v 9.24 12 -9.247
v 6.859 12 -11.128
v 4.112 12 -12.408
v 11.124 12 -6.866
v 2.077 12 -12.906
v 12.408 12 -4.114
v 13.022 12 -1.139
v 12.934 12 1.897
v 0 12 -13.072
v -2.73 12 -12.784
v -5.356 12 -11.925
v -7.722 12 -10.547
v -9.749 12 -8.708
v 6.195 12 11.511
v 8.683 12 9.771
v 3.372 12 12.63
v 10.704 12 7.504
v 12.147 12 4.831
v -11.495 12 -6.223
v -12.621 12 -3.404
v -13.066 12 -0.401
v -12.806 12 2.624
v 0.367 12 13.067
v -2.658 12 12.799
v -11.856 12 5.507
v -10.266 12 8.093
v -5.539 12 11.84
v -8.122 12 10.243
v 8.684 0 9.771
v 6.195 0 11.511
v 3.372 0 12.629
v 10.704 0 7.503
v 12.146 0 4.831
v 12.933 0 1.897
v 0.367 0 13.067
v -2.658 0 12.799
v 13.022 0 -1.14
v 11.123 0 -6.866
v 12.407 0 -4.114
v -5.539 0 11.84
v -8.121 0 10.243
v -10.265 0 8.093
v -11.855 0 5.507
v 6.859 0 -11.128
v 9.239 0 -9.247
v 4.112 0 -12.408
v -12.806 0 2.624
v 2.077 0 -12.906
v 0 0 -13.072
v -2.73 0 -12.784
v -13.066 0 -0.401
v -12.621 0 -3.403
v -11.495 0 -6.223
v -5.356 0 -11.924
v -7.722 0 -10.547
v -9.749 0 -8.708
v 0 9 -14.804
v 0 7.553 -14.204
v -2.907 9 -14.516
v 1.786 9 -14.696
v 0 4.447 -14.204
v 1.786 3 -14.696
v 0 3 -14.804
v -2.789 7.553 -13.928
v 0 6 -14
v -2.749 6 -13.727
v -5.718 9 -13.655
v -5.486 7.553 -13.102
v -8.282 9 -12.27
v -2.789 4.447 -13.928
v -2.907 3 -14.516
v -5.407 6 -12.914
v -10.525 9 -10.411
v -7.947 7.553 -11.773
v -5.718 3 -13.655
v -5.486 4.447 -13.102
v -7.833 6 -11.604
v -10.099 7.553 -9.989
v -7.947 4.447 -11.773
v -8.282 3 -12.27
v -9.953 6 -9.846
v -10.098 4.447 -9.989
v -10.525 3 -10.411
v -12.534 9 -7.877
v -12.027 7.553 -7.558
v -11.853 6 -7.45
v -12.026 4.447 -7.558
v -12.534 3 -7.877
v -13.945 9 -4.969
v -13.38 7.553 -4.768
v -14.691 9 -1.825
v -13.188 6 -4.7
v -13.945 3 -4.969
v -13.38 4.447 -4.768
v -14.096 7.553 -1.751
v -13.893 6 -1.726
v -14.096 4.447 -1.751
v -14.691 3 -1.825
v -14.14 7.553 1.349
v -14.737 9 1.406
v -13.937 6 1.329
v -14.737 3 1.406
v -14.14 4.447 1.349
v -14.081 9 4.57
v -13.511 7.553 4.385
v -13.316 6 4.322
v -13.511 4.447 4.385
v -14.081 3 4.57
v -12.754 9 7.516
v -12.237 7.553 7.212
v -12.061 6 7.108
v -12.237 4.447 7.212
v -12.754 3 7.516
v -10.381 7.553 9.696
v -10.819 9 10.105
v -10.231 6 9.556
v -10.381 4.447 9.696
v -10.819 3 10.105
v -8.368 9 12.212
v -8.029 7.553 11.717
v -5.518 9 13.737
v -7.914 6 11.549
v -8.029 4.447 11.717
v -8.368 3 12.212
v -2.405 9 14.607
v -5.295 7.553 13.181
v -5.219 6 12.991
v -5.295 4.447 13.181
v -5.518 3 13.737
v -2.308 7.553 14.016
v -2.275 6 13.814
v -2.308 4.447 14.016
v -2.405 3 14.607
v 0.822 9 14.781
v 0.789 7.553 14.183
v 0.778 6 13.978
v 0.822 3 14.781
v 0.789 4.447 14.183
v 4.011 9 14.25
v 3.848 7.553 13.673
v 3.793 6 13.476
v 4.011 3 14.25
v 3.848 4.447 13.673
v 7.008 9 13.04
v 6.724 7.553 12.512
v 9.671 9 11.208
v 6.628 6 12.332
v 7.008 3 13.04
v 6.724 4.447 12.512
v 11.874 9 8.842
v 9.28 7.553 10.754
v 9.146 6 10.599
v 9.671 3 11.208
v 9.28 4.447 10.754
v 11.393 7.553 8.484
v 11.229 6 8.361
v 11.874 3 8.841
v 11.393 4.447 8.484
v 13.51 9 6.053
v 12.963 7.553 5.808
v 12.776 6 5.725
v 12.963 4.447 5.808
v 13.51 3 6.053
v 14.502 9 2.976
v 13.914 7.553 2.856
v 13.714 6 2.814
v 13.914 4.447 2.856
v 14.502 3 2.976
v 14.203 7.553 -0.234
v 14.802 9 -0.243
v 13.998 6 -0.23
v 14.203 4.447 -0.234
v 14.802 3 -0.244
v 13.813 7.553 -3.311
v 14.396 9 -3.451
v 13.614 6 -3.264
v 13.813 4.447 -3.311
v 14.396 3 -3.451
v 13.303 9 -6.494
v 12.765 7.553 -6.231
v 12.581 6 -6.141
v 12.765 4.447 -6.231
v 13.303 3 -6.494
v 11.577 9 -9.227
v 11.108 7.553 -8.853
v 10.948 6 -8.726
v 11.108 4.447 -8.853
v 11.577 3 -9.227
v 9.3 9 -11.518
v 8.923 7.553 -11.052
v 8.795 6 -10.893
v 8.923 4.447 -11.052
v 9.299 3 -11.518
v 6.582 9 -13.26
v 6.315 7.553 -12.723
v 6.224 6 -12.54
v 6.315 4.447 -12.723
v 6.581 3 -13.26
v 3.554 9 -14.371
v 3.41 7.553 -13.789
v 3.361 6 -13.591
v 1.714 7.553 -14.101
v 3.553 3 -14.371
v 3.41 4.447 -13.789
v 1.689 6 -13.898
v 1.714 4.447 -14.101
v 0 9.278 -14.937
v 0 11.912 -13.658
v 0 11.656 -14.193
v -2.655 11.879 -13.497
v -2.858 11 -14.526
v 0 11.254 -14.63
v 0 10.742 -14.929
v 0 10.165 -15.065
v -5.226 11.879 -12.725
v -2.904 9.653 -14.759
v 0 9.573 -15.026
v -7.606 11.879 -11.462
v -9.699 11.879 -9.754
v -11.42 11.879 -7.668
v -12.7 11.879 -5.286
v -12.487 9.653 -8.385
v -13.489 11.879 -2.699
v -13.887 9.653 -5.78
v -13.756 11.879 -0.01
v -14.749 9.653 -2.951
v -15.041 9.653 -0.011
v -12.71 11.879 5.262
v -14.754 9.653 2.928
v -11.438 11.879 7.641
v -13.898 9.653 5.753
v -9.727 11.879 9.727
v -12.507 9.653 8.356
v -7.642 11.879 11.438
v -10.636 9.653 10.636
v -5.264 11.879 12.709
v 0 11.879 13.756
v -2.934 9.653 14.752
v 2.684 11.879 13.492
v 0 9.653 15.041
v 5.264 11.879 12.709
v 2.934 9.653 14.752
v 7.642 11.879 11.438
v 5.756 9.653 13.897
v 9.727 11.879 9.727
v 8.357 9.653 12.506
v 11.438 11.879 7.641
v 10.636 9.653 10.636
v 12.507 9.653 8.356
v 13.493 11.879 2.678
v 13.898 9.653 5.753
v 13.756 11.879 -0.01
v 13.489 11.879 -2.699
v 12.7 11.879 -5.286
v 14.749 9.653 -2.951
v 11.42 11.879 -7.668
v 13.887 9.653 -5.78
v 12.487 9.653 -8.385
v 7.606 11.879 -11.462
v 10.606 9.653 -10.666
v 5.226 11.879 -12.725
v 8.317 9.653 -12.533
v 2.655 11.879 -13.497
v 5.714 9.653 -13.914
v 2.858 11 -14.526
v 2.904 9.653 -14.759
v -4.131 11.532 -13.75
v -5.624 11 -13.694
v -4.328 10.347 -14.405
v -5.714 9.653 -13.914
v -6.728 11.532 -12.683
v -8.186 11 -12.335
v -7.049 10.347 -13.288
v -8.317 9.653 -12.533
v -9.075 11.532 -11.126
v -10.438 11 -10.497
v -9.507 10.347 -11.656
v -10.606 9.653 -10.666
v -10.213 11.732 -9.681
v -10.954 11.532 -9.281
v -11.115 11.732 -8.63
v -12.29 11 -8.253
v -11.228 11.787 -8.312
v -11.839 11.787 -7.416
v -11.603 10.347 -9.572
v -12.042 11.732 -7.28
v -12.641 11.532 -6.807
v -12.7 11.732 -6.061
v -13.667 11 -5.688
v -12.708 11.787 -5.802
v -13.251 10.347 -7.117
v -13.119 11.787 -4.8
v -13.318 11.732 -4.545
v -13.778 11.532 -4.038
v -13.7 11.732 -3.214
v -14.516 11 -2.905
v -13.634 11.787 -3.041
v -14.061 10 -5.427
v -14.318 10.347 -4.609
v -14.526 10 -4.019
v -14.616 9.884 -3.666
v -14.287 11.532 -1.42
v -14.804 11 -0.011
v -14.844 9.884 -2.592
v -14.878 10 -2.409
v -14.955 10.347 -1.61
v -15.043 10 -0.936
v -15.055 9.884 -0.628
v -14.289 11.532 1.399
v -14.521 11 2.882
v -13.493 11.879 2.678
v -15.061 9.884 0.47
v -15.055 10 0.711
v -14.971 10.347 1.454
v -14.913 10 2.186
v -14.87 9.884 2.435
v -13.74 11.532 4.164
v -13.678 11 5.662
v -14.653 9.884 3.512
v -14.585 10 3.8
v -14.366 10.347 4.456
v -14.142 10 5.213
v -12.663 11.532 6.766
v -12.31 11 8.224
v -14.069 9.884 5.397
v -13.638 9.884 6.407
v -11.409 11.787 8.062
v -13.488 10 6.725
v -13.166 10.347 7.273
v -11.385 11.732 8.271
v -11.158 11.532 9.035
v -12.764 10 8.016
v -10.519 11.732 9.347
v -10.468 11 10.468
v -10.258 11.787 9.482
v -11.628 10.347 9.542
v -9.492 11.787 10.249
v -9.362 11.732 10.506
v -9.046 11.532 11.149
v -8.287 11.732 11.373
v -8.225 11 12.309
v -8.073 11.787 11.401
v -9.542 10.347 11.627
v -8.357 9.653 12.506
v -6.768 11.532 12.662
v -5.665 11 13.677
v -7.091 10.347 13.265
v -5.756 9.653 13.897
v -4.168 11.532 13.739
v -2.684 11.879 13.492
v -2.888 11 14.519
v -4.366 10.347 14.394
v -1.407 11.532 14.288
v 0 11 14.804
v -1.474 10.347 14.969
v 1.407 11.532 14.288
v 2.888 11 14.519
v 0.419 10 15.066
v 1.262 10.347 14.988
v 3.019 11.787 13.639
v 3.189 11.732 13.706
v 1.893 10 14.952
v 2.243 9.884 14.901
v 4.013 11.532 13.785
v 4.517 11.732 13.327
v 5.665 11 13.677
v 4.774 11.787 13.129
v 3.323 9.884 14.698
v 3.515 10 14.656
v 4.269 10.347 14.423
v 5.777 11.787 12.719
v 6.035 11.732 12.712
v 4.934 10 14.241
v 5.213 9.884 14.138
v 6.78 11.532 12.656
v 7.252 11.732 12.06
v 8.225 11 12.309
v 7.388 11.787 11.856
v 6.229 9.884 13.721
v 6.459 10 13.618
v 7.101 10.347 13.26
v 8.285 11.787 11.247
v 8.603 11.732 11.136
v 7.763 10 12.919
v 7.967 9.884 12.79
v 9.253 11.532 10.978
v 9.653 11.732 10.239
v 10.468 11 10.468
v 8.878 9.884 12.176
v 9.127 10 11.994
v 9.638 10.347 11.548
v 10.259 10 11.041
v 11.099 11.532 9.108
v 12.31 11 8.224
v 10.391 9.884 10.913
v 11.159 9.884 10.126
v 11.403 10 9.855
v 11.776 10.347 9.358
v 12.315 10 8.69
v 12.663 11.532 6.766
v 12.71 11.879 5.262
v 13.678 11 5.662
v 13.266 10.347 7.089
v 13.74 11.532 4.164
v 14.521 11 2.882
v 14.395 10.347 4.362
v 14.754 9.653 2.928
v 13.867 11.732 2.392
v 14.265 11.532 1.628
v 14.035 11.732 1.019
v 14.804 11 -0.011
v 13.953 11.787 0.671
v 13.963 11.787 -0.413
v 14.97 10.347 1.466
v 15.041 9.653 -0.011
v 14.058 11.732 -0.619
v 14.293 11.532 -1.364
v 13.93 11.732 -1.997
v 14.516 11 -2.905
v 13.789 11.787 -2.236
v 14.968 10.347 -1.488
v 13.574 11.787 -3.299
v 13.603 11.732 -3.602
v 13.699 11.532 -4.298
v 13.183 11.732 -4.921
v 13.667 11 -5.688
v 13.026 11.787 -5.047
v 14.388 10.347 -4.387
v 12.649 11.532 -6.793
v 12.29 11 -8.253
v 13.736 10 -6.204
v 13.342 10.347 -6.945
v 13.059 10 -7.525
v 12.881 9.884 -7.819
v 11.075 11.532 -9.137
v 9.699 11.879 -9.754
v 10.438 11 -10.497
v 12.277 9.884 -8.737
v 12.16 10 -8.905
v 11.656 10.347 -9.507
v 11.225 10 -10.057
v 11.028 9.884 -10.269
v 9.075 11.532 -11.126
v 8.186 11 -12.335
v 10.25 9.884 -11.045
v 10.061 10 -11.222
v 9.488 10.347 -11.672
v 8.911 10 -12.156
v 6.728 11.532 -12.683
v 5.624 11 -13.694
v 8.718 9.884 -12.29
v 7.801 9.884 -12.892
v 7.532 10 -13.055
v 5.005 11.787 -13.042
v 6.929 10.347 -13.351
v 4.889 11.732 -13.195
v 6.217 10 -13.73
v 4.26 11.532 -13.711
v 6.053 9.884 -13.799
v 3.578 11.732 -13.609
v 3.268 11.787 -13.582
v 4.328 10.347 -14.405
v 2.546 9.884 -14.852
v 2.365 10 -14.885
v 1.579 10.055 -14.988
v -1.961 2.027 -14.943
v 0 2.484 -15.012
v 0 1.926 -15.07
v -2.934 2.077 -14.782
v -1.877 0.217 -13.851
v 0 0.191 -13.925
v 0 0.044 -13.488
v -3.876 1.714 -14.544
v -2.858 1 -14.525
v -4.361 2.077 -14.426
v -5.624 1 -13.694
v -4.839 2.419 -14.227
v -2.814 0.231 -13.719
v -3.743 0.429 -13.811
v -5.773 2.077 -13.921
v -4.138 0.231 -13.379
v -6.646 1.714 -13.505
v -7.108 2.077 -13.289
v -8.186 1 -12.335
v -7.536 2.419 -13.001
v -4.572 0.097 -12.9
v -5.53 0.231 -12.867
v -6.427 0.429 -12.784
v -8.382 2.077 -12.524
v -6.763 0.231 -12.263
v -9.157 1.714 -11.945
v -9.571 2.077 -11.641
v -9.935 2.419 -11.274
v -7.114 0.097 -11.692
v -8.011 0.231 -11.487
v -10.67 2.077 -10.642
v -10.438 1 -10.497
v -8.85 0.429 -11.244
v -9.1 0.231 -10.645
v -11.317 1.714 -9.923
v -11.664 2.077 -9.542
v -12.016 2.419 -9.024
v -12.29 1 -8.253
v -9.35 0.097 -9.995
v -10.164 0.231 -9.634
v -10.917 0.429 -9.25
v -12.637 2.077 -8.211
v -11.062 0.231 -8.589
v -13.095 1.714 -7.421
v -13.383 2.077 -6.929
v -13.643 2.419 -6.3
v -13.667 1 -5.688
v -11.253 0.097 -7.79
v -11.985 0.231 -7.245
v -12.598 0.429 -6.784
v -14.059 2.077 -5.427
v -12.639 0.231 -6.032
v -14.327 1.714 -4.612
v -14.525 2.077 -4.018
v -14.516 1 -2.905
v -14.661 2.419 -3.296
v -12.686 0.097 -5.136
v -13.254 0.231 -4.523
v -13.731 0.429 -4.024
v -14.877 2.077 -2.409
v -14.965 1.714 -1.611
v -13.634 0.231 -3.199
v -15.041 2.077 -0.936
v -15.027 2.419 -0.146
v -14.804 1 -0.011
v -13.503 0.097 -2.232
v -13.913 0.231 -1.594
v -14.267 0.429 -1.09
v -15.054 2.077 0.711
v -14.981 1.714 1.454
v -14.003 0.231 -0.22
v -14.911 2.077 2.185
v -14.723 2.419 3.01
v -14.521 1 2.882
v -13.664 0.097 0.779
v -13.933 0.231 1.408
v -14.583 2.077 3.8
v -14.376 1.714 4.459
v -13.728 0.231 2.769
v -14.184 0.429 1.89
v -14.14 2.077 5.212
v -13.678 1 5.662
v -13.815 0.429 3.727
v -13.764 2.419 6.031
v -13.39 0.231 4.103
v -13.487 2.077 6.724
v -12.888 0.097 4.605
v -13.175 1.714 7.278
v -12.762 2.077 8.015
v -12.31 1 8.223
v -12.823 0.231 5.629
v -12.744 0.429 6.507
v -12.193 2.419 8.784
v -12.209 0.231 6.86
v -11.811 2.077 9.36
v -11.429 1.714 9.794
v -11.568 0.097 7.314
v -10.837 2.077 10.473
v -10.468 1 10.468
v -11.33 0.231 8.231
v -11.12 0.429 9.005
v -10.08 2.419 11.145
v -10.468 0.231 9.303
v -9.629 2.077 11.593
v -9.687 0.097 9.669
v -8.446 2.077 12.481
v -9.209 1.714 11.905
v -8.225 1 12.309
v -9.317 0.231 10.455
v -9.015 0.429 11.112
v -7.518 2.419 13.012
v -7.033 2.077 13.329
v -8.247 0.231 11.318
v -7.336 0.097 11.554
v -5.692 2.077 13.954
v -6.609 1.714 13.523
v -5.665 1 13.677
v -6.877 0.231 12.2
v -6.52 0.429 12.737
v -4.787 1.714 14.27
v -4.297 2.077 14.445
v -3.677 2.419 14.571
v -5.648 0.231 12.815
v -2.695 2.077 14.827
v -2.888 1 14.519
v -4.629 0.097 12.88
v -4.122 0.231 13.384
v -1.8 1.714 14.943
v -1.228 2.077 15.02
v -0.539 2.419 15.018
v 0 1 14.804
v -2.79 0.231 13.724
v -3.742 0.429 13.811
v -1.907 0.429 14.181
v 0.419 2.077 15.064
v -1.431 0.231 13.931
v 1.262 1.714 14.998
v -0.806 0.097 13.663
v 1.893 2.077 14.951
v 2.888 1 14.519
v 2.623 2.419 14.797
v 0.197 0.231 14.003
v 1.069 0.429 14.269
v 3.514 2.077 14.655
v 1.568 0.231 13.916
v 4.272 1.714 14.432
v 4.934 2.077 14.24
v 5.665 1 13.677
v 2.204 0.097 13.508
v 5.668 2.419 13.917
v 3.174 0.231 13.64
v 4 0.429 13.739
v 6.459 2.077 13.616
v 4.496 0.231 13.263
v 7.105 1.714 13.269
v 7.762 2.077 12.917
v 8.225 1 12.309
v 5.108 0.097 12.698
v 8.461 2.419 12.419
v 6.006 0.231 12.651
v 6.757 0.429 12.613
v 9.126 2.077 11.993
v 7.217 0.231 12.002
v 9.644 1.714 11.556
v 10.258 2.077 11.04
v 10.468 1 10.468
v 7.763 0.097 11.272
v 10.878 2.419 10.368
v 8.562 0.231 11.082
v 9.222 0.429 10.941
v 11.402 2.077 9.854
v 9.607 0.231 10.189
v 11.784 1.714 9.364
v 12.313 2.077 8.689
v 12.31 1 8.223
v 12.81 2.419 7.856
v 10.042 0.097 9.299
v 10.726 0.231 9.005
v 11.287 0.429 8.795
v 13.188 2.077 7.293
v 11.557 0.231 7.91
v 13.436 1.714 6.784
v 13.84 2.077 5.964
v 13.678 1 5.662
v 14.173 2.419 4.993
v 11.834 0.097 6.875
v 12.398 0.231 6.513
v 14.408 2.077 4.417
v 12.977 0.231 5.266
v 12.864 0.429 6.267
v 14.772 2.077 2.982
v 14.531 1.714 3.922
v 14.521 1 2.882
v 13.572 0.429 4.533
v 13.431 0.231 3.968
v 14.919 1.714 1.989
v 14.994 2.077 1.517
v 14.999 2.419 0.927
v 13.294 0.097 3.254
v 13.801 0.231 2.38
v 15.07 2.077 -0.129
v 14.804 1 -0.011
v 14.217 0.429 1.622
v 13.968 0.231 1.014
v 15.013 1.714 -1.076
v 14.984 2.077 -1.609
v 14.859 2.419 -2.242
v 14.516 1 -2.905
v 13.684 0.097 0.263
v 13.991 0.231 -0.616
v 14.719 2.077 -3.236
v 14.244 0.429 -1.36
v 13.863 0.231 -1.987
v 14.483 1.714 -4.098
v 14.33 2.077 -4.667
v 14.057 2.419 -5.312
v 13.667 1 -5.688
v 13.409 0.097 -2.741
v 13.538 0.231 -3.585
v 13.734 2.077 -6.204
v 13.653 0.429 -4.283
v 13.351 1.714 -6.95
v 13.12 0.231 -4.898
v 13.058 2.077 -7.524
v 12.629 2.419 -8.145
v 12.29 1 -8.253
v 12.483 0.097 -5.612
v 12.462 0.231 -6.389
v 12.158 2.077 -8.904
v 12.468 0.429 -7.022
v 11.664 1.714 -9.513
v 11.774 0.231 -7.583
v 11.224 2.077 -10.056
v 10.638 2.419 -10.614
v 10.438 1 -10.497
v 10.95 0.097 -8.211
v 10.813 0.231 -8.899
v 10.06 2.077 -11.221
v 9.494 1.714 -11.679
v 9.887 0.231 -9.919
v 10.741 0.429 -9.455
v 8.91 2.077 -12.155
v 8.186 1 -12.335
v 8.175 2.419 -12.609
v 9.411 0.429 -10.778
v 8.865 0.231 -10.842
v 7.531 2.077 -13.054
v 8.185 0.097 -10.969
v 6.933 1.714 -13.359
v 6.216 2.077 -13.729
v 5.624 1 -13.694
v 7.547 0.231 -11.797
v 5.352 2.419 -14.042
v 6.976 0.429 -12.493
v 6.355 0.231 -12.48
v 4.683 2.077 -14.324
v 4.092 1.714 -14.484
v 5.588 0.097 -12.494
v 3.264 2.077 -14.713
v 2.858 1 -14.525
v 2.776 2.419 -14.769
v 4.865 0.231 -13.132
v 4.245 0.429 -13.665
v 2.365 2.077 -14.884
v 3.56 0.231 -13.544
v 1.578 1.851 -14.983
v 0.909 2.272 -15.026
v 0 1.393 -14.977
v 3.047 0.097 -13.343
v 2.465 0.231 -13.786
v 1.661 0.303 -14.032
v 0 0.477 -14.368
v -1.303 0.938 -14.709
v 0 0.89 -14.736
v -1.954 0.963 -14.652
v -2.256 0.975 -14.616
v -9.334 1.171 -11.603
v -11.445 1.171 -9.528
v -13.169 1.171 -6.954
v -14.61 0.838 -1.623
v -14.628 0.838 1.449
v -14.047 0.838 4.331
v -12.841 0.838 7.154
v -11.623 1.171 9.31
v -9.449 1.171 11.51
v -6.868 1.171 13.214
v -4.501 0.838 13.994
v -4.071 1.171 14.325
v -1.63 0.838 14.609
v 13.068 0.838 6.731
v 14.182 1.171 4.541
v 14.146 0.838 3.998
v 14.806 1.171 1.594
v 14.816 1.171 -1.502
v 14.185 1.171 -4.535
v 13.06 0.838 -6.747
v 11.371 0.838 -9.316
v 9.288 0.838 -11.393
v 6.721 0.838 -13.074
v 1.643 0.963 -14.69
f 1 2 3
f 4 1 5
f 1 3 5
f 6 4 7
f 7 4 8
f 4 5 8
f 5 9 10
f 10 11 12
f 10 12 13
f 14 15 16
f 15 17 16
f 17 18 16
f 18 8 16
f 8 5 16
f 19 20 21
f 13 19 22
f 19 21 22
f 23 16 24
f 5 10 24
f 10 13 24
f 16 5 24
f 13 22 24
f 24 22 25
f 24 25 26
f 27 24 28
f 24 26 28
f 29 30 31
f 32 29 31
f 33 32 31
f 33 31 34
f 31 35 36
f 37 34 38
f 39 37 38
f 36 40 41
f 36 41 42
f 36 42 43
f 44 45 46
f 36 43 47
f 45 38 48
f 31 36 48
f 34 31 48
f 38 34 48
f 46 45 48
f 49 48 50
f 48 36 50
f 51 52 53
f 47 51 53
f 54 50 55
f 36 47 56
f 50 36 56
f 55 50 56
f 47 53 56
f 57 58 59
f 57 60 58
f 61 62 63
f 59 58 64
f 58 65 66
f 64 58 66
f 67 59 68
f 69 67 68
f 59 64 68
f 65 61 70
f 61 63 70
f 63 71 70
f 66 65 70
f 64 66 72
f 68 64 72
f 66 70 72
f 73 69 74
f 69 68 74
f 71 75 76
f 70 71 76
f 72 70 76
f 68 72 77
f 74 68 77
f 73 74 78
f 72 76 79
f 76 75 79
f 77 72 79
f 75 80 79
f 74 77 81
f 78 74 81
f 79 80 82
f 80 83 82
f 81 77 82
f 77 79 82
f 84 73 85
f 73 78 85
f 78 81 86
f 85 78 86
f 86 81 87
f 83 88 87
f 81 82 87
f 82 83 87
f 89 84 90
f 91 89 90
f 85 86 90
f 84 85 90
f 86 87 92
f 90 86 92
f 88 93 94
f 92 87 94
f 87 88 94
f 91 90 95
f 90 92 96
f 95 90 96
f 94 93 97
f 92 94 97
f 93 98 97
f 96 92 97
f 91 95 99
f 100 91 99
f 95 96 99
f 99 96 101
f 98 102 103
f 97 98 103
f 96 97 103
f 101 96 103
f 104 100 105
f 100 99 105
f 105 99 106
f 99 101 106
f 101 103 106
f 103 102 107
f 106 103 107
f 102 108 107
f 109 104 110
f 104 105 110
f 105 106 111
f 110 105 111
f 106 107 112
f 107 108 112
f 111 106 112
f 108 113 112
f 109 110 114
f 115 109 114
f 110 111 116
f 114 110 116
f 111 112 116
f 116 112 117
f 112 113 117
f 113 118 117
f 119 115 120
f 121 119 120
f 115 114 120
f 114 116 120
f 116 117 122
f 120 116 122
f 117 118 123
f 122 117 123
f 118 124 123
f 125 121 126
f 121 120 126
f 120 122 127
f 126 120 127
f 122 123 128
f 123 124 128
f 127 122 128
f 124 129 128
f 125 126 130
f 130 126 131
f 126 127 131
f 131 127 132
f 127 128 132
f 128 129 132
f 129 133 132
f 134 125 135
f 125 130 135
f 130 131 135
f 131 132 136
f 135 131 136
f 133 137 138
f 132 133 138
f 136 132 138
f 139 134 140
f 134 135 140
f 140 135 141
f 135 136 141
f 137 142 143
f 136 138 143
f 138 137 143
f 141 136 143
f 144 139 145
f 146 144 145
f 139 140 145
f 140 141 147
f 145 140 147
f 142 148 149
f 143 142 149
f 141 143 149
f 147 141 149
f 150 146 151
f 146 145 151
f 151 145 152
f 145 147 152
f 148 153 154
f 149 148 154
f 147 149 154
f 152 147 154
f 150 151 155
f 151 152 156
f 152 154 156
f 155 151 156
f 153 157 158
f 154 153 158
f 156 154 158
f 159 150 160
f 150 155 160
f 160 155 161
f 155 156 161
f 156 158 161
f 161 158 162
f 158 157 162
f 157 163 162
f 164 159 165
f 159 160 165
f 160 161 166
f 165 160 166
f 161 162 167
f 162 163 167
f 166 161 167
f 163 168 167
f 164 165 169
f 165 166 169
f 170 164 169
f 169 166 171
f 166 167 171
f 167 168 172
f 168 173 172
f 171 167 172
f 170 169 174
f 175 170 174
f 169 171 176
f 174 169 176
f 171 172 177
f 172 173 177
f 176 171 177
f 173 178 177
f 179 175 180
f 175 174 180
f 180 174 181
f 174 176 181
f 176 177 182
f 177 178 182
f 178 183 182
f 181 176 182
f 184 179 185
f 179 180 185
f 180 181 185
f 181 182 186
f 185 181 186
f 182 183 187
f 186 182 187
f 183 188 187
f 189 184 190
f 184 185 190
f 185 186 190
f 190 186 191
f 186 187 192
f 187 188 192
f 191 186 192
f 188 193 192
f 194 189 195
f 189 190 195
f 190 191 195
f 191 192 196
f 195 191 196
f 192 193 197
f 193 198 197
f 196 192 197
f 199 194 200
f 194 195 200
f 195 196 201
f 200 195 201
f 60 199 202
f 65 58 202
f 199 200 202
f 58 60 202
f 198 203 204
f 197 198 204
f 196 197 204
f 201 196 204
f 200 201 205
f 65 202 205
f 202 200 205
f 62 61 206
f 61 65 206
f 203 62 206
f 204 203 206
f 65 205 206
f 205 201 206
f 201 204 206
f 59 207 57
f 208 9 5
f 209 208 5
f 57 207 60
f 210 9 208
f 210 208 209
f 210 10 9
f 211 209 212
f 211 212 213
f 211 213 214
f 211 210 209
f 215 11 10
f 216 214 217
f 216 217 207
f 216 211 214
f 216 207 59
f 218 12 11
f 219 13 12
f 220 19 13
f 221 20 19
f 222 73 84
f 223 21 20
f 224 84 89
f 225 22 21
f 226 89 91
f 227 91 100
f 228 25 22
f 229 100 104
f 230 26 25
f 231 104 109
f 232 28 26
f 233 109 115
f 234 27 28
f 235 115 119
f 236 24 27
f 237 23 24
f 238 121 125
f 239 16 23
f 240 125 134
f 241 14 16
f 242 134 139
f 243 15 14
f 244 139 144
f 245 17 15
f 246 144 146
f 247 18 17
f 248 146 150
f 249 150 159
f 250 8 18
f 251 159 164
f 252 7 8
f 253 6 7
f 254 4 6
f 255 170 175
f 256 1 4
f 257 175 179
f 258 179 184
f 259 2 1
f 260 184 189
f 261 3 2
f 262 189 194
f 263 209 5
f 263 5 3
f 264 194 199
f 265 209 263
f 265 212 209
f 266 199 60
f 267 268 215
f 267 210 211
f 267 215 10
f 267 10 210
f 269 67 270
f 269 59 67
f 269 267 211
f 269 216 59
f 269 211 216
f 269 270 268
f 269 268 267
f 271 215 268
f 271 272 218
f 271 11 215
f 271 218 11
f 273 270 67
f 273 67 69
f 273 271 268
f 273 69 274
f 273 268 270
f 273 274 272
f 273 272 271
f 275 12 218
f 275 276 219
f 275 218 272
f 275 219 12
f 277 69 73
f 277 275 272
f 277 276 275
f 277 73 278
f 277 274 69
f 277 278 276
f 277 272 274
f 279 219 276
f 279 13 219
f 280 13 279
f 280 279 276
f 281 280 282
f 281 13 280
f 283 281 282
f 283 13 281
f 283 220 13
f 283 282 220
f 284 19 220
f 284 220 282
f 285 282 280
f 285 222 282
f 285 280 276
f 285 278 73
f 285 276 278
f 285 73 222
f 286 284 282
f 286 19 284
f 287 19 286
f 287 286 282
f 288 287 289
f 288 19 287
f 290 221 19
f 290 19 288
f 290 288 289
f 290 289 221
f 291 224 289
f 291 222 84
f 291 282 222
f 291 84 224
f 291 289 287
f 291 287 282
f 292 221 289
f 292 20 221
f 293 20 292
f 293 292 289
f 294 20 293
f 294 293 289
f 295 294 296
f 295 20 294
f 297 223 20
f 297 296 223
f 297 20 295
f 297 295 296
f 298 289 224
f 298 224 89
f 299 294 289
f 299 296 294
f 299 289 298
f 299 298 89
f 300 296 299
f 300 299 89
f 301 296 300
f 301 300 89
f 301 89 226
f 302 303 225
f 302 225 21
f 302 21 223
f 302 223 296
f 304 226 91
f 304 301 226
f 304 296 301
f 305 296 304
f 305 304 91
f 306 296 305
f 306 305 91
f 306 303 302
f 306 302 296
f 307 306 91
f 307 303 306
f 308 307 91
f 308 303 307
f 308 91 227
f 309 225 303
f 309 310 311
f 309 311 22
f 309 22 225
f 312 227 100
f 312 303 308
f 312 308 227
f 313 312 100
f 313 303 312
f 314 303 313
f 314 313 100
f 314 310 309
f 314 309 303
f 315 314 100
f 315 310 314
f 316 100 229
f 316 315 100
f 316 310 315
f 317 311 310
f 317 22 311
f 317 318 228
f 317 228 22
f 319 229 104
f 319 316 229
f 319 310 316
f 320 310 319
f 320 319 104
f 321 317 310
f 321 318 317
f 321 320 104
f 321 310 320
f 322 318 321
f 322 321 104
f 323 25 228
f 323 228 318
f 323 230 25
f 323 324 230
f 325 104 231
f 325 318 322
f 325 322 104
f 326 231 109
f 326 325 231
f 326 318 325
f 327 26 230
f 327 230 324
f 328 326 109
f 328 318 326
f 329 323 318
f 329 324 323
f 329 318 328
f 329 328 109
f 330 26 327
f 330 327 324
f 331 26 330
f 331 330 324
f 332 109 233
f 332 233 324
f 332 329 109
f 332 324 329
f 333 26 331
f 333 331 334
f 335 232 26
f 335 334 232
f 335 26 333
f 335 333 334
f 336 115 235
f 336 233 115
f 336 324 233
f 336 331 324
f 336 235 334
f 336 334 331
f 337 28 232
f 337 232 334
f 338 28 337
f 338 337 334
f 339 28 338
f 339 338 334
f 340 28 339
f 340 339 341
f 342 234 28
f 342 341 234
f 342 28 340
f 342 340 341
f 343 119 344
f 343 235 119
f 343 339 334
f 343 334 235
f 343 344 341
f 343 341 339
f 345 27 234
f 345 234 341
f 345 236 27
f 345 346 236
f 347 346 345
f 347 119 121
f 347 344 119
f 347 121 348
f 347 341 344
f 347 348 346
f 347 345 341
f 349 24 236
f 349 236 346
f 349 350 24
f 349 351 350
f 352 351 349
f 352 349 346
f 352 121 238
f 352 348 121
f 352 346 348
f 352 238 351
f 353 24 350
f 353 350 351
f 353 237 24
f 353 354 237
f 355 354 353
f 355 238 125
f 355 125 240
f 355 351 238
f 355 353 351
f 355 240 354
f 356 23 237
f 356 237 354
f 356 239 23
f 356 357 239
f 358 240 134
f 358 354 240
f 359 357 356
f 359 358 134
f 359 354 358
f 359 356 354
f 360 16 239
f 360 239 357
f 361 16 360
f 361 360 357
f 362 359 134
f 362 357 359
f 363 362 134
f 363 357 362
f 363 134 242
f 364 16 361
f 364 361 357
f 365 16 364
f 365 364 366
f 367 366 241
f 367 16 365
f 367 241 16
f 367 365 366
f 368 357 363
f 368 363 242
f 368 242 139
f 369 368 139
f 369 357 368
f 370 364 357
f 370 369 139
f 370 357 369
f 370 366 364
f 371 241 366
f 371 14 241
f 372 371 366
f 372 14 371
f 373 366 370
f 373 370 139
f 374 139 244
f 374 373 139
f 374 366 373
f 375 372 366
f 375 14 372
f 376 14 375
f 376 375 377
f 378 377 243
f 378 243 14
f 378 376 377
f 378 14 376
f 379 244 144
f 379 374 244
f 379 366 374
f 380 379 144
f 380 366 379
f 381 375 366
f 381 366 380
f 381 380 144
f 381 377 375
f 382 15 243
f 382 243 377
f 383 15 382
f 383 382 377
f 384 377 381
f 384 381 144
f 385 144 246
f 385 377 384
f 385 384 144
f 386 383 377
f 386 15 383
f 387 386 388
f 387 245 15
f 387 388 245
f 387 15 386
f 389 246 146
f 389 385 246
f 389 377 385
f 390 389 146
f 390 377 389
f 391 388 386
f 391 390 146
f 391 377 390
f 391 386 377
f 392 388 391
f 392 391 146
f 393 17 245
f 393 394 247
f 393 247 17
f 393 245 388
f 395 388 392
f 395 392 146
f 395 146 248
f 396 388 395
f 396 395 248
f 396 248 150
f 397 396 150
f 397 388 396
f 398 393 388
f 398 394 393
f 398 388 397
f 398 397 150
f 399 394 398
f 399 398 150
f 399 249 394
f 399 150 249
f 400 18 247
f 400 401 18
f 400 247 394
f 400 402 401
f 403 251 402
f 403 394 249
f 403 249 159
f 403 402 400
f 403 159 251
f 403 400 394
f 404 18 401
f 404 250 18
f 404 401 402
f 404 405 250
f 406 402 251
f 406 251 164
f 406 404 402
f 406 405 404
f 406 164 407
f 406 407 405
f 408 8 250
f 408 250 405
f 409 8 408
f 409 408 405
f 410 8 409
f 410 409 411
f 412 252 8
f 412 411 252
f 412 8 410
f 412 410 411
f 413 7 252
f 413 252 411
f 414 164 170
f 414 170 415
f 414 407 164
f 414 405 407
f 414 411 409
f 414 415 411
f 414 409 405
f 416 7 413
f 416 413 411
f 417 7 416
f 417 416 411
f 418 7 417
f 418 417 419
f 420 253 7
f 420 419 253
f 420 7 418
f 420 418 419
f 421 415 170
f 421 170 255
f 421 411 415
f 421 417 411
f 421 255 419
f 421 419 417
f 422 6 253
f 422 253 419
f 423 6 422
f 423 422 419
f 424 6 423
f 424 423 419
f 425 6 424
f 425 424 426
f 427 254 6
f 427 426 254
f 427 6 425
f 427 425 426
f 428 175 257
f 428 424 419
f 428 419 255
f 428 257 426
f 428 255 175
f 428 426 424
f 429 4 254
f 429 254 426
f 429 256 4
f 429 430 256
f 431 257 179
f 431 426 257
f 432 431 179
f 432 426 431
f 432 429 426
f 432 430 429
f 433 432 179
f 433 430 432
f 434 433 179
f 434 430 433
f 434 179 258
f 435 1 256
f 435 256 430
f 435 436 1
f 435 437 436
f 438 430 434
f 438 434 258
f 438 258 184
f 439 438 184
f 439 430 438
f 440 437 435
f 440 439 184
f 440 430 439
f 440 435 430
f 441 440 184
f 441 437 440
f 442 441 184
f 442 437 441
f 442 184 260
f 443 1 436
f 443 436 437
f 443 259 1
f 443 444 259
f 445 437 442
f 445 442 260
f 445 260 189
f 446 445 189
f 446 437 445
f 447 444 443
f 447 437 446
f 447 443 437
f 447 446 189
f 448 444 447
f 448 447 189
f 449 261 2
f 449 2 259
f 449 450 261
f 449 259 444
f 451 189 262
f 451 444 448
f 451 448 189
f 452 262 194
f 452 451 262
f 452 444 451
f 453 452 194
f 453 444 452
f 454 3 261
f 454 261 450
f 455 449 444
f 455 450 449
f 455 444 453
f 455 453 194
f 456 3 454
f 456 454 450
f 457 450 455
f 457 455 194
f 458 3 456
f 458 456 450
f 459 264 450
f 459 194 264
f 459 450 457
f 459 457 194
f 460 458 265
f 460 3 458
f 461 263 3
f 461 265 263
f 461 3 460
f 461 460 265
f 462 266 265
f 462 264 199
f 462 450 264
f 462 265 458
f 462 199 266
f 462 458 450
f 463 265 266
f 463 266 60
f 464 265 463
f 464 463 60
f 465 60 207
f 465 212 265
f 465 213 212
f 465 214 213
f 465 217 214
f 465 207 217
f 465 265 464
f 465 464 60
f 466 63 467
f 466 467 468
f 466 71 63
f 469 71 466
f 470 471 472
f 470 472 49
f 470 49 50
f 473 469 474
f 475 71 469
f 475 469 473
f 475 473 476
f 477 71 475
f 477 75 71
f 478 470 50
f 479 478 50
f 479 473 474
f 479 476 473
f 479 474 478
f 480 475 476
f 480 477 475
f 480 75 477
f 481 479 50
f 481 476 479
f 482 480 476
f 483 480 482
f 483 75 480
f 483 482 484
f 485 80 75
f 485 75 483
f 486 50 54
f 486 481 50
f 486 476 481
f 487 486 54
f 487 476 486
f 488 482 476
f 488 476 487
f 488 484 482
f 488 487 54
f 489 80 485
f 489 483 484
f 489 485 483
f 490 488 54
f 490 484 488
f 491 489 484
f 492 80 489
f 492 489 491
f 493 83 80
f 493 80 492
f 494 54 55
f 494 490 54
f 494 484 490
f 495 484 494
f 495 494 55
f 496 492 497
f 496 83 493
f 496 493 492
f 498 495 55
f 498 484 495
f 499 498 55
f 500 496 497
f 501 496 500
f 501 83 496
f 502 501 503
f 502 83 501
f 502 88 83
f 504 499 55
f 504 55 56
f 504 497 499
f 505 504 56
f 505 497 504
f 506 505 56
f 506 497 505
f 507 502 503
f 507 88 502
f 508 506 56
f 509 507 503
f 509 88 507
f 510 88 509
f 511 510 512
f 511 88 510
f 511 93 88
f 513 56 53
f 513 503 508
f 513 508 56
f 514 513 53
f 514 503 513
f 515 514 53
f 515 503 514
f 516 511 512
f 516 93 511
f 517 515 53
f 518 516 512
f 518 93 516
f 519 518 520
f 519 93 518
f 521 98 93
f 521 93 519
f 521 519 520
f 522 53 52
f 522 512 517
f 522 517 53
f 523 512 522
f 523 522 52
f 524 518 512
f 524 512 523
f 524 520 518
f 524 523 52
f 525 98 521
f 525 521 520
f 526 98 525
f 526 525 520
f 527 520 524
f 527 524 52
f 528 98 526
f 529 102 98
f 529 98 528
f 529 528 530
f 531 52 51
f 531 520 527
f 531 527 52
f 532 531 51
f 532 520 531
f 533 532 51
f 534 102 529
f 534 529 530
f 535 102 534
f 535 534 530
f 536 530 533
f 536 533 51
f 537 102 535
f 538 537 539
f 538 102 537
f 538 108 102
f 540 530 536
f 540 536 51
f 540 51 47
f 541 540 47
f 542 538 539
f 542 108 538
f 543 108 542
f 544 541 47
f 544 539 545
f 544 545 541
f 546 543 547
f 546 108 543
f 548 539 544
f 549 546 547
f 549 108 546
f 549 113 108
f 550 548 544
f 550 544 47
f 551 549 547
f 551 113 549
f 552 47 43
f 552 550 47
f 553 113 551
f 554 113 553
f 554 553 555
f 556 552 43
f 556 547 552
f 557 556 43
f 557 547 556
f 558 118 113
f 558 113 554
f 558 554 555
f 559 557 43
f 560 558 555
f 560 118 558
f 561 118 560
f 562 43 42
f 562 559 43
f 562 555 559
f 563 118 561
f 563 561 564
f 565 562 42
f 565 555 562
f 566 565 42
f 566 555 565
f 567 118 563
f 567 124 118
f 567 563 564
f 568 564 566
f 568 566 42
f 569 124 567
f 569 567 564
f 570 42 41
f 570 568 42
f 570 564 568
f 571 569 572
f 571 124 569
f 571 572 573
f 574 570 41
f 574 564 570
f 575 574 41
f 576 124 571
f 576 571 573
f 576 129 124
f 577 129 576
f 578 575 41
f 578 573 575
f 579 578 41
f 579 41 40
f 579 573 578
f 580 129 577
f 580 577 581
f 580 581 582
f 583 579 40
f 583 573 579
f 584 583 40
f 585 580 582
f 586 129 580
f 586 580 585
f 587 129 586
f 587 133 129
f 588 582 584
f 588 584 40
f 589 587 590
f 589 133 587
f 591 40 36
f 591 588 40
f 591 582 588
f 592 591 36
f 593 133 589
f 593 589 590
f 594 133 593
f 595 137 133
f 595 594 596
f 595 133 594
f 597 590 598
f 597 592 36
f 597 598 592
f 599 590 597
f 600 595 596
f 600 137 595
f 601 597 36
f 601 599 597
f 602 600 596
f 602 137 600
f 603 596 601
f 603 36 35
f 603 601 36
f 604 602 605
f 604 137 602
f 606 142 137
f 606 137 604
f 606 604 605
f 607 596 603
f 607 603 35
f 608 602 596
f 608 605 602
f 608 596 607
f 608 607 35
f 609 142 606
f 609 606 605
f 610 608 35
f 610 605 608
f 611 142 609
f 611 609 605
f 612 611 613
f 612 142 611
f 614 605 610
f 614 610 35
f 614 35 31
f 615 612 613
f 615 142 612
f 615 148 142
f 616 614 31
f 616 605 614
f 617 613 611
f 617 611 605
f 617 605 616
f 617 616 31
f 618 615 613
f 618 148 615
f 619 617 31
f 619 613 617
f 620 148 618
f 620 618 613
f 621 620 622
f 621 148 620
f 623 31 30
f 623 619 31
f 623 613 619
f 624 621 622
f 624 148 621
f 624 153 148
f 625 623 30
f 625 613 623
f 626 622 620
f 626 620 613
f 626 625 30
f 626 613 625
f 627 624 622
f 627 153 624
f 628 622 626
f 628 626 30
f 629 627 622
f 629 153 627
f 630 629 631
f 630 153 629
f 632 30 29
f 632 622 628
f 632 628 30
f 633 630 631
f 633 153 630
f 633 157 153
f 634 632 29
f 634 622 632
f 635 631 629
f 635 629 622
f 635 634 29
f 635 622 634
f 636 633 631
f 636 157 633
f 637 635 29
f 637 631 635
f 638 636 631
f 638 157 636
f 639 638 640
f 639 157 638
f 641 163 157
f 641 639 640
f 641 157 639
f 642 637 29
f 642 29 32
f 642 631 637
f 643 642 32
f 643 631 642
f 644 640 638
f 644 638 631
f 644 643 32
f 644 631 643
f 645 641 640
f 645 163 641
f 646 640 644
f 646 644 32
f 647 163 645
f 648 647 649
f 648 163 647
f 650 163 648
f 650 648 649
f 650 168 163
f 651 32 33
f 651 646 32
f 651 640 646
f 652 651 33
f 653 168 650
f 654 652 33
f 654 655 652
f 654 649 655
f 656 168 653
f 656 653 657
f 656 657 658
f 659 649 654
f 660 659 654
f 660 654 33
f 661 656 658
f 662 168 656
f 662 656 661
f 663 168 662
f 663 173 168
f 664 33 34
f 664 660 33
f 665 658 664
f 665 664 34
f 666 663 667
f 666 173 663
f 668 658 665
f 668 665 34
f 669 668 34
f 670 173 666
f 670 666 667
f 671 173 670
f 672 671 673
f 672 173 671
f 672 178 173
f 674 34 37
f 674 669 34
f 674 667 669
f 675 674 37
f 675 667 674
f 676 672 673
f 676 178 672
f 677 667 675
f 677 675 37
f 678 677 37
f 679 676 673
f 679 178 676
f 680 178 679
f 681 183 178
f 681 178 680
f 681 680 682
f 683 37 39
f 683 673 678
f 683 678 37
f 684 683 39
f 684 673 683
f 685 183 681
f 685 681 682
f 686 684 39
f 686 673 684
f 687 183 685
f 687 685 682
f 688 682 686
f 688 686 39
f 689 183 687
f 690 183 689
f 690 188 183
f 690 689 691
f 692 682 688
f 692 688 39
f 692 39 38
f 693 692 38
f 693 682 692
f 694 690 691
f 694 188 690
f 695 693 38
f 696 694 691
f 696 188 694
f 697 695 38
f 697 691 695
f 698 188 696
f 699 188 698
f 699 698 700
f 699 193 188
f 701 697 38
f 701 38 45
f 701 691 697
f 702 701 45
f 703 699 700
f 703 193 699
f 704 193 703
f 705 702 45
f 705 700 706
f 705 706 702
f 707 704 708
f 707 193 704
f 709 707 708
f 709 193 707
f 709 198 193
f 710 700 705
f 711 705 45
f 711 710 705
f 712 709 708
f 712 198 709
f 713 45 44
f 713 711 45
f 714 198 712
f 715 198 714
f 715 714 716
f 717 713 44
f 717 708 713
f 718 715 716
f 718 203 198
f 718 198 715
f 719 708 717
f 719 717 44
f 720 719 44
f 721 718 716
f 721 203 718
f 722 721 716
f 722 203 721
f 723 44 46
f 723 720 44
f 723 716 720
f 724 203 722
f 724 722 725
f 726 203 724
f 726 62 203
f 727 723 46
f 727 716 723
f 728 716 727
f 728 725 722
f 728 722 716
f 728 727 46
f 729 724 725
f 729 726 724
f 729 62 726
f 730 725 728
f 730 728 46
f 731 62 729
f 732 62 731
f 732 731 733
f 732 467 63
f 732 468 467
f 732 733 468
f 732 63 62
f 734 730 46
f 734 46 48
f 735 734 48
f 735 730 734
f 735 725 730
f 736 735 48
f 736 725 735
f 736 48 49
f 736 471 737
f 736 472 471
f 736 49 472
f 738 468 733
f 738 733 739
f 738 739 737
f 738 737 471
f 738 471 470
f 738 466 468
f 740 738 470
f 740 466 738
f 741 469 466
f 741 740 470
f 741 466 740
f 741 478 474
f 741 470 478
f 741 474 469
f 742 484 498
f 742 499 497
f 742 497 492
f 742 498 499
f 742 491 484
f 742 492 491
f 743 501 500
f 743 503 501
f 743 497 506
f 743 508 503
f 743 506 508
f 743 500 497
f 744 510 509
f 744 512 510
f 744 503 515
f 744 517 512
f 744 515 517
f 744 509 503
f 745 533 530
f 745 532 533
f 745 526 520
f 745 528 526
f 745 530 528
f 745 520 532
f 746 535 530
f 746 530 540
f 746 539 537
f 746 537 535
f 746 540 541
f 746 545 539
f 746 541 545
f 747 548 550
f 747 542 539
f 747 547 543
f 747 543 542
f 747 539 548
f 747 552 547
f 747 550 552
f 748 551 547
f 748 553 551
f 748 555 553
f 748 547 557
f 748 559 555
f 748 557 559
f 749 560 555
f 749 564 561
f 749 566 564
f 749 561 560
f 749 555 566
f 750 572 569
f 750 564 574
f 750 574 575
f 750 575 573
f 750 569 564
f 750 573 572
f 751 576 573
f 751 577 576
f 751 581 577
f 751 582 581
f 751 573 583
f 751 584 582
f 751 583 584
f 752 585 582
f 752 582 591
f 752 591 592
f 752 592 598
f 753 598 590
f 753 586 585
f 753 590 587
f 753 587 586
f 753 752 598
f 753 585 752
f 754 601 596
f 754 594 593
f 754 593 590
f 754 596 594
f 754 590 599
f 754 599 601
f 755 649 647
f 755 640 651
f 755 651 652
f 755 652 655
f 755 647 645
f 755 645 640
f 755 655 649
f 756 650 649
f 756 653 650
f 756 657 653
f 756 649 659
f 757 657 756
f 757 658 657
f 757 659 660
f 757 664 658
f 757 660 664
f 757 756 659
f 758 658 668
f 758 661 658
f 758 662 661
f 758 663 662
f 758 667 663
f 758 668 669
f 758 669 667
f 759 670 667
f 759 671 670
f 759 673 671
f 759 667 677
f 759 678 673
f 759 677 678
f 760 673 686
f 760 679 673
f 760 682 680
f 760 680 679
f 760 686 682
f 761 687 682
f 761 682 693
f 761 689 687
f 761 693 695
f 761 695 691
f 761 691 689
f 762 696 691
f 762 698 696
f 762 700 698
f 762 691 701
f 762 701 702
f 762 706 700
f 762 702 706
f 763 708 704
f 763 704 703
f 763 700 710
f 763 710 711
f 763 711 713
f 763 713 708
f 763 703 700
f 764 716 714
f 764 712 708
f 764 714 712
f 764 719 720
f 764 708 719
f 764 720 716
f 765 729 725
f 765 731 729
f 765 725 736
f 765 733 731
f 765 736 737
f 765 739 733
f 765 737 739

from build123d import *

# Parameters (mm, degrees)
FILLET4_R = 2
FILLET5_R = 2
FILLET6_R = 2
FILLET7_R = 2


# Some blends are built 0.0001 mm under size
with BuildPart() as part:
    # Sketch2 → Revolve1 (revolve)
    with BuildSketch(Plane.XY, mode=Mode.PRIVATE) as revolve1_sk:
        with BuildLine():
            Line((0, 0), (0, 12))
            Line((0, 12), (17, 12))
            Line((17, 12), (17, 11.196152423))
            ThreePointArc((17, 11.196152423), (14, 6), (17, 0.803847577))
            Line((17, 0.803847577), (17, 0))
            Line((17, 0), (0, 0))
        make_face()
    revolve(revolve1_sk.sketch.rotate(Axis((0, 0, 0), (0, 1, 0)), 90), axis=Axis((0, 0, 0), (0, 1, 0)))

    # Fillet4
    # the kernel refuses this fillet: 2 mm, written as the material it takes off along each edge
    with BuildSketch(Plane(origin=(0, 12, 0), x_dir=(0, 0, -1), z_dir=(1, 0, 0))) as fillet4_piece_1:
        with BuildLine():
            CenterArc((15.397121532, -2), FILLET4_R, 36.732240325, 53.267759675)
            Line((17, -0.803847577), (17.032057569, -0.779924529))
            ThreePointArc((17.032057569, -0.779924529), (17.04, -0.401923789), (17.04, 0))
            Line((17.04, 0), (17, 0.04))
            Line((17, 0.04), (15.397121532, 0.04))
            Line((15.397121532, 0.04), (15.397121532, 0))
        make_face()
    revolve(axis=Axis((0, 12, 0), (0, 1, 0)), mode=Mode.SUBTRACT)

    # Fillet5
    fillet5_edges = [part.edges().sort_by_distance(p)[0] for p in [
        (0, 11.196152423, 17),
    ]]
    fillet(fillet5_edges, radius=FILLET5_R - 0.0001)  # a hair under: the kernel refuses the full size

    # Fillet6
    # the kernel refuses this fillet: 2 mm, written as the material it takes off along each edge
    with BuildSketch(Plane(origin=(0, 0, 0), x_dir=(0, 0, -1), z_dir=(1, 0, 0))) as fillet6_piece_1:
        with BuildLine():
            CenterArc((15.397121532, 2), FILLET6_R, 270, 53.267759675)
            Line((15.397121532, 0), (15.397121532, -0.04))
            Line((15.397121532, -0.04), (17, -0.04))
            Line((17, -0.04), (17.04, 0))
            ThreePointArc((17.04, 0), (17.04, 0.401923789), (17.032057569, 0.779924529))
            Line((17.032057569, 0.779924529), (17, 0.803847577))
        make_face()
    revolve(axis=Axis((0, 0, 0), (0, 1, 0)), mode=Mode.SUBTRACT)

    # Fillet7
    fillet7_edges = [part.edges().sort_by_distance(p)[0] for p in [
        (0, 0.803847577, 17),
    ]]
    fillet(fillet7_edges, radius=FILLET7_R)


solid = part.part
